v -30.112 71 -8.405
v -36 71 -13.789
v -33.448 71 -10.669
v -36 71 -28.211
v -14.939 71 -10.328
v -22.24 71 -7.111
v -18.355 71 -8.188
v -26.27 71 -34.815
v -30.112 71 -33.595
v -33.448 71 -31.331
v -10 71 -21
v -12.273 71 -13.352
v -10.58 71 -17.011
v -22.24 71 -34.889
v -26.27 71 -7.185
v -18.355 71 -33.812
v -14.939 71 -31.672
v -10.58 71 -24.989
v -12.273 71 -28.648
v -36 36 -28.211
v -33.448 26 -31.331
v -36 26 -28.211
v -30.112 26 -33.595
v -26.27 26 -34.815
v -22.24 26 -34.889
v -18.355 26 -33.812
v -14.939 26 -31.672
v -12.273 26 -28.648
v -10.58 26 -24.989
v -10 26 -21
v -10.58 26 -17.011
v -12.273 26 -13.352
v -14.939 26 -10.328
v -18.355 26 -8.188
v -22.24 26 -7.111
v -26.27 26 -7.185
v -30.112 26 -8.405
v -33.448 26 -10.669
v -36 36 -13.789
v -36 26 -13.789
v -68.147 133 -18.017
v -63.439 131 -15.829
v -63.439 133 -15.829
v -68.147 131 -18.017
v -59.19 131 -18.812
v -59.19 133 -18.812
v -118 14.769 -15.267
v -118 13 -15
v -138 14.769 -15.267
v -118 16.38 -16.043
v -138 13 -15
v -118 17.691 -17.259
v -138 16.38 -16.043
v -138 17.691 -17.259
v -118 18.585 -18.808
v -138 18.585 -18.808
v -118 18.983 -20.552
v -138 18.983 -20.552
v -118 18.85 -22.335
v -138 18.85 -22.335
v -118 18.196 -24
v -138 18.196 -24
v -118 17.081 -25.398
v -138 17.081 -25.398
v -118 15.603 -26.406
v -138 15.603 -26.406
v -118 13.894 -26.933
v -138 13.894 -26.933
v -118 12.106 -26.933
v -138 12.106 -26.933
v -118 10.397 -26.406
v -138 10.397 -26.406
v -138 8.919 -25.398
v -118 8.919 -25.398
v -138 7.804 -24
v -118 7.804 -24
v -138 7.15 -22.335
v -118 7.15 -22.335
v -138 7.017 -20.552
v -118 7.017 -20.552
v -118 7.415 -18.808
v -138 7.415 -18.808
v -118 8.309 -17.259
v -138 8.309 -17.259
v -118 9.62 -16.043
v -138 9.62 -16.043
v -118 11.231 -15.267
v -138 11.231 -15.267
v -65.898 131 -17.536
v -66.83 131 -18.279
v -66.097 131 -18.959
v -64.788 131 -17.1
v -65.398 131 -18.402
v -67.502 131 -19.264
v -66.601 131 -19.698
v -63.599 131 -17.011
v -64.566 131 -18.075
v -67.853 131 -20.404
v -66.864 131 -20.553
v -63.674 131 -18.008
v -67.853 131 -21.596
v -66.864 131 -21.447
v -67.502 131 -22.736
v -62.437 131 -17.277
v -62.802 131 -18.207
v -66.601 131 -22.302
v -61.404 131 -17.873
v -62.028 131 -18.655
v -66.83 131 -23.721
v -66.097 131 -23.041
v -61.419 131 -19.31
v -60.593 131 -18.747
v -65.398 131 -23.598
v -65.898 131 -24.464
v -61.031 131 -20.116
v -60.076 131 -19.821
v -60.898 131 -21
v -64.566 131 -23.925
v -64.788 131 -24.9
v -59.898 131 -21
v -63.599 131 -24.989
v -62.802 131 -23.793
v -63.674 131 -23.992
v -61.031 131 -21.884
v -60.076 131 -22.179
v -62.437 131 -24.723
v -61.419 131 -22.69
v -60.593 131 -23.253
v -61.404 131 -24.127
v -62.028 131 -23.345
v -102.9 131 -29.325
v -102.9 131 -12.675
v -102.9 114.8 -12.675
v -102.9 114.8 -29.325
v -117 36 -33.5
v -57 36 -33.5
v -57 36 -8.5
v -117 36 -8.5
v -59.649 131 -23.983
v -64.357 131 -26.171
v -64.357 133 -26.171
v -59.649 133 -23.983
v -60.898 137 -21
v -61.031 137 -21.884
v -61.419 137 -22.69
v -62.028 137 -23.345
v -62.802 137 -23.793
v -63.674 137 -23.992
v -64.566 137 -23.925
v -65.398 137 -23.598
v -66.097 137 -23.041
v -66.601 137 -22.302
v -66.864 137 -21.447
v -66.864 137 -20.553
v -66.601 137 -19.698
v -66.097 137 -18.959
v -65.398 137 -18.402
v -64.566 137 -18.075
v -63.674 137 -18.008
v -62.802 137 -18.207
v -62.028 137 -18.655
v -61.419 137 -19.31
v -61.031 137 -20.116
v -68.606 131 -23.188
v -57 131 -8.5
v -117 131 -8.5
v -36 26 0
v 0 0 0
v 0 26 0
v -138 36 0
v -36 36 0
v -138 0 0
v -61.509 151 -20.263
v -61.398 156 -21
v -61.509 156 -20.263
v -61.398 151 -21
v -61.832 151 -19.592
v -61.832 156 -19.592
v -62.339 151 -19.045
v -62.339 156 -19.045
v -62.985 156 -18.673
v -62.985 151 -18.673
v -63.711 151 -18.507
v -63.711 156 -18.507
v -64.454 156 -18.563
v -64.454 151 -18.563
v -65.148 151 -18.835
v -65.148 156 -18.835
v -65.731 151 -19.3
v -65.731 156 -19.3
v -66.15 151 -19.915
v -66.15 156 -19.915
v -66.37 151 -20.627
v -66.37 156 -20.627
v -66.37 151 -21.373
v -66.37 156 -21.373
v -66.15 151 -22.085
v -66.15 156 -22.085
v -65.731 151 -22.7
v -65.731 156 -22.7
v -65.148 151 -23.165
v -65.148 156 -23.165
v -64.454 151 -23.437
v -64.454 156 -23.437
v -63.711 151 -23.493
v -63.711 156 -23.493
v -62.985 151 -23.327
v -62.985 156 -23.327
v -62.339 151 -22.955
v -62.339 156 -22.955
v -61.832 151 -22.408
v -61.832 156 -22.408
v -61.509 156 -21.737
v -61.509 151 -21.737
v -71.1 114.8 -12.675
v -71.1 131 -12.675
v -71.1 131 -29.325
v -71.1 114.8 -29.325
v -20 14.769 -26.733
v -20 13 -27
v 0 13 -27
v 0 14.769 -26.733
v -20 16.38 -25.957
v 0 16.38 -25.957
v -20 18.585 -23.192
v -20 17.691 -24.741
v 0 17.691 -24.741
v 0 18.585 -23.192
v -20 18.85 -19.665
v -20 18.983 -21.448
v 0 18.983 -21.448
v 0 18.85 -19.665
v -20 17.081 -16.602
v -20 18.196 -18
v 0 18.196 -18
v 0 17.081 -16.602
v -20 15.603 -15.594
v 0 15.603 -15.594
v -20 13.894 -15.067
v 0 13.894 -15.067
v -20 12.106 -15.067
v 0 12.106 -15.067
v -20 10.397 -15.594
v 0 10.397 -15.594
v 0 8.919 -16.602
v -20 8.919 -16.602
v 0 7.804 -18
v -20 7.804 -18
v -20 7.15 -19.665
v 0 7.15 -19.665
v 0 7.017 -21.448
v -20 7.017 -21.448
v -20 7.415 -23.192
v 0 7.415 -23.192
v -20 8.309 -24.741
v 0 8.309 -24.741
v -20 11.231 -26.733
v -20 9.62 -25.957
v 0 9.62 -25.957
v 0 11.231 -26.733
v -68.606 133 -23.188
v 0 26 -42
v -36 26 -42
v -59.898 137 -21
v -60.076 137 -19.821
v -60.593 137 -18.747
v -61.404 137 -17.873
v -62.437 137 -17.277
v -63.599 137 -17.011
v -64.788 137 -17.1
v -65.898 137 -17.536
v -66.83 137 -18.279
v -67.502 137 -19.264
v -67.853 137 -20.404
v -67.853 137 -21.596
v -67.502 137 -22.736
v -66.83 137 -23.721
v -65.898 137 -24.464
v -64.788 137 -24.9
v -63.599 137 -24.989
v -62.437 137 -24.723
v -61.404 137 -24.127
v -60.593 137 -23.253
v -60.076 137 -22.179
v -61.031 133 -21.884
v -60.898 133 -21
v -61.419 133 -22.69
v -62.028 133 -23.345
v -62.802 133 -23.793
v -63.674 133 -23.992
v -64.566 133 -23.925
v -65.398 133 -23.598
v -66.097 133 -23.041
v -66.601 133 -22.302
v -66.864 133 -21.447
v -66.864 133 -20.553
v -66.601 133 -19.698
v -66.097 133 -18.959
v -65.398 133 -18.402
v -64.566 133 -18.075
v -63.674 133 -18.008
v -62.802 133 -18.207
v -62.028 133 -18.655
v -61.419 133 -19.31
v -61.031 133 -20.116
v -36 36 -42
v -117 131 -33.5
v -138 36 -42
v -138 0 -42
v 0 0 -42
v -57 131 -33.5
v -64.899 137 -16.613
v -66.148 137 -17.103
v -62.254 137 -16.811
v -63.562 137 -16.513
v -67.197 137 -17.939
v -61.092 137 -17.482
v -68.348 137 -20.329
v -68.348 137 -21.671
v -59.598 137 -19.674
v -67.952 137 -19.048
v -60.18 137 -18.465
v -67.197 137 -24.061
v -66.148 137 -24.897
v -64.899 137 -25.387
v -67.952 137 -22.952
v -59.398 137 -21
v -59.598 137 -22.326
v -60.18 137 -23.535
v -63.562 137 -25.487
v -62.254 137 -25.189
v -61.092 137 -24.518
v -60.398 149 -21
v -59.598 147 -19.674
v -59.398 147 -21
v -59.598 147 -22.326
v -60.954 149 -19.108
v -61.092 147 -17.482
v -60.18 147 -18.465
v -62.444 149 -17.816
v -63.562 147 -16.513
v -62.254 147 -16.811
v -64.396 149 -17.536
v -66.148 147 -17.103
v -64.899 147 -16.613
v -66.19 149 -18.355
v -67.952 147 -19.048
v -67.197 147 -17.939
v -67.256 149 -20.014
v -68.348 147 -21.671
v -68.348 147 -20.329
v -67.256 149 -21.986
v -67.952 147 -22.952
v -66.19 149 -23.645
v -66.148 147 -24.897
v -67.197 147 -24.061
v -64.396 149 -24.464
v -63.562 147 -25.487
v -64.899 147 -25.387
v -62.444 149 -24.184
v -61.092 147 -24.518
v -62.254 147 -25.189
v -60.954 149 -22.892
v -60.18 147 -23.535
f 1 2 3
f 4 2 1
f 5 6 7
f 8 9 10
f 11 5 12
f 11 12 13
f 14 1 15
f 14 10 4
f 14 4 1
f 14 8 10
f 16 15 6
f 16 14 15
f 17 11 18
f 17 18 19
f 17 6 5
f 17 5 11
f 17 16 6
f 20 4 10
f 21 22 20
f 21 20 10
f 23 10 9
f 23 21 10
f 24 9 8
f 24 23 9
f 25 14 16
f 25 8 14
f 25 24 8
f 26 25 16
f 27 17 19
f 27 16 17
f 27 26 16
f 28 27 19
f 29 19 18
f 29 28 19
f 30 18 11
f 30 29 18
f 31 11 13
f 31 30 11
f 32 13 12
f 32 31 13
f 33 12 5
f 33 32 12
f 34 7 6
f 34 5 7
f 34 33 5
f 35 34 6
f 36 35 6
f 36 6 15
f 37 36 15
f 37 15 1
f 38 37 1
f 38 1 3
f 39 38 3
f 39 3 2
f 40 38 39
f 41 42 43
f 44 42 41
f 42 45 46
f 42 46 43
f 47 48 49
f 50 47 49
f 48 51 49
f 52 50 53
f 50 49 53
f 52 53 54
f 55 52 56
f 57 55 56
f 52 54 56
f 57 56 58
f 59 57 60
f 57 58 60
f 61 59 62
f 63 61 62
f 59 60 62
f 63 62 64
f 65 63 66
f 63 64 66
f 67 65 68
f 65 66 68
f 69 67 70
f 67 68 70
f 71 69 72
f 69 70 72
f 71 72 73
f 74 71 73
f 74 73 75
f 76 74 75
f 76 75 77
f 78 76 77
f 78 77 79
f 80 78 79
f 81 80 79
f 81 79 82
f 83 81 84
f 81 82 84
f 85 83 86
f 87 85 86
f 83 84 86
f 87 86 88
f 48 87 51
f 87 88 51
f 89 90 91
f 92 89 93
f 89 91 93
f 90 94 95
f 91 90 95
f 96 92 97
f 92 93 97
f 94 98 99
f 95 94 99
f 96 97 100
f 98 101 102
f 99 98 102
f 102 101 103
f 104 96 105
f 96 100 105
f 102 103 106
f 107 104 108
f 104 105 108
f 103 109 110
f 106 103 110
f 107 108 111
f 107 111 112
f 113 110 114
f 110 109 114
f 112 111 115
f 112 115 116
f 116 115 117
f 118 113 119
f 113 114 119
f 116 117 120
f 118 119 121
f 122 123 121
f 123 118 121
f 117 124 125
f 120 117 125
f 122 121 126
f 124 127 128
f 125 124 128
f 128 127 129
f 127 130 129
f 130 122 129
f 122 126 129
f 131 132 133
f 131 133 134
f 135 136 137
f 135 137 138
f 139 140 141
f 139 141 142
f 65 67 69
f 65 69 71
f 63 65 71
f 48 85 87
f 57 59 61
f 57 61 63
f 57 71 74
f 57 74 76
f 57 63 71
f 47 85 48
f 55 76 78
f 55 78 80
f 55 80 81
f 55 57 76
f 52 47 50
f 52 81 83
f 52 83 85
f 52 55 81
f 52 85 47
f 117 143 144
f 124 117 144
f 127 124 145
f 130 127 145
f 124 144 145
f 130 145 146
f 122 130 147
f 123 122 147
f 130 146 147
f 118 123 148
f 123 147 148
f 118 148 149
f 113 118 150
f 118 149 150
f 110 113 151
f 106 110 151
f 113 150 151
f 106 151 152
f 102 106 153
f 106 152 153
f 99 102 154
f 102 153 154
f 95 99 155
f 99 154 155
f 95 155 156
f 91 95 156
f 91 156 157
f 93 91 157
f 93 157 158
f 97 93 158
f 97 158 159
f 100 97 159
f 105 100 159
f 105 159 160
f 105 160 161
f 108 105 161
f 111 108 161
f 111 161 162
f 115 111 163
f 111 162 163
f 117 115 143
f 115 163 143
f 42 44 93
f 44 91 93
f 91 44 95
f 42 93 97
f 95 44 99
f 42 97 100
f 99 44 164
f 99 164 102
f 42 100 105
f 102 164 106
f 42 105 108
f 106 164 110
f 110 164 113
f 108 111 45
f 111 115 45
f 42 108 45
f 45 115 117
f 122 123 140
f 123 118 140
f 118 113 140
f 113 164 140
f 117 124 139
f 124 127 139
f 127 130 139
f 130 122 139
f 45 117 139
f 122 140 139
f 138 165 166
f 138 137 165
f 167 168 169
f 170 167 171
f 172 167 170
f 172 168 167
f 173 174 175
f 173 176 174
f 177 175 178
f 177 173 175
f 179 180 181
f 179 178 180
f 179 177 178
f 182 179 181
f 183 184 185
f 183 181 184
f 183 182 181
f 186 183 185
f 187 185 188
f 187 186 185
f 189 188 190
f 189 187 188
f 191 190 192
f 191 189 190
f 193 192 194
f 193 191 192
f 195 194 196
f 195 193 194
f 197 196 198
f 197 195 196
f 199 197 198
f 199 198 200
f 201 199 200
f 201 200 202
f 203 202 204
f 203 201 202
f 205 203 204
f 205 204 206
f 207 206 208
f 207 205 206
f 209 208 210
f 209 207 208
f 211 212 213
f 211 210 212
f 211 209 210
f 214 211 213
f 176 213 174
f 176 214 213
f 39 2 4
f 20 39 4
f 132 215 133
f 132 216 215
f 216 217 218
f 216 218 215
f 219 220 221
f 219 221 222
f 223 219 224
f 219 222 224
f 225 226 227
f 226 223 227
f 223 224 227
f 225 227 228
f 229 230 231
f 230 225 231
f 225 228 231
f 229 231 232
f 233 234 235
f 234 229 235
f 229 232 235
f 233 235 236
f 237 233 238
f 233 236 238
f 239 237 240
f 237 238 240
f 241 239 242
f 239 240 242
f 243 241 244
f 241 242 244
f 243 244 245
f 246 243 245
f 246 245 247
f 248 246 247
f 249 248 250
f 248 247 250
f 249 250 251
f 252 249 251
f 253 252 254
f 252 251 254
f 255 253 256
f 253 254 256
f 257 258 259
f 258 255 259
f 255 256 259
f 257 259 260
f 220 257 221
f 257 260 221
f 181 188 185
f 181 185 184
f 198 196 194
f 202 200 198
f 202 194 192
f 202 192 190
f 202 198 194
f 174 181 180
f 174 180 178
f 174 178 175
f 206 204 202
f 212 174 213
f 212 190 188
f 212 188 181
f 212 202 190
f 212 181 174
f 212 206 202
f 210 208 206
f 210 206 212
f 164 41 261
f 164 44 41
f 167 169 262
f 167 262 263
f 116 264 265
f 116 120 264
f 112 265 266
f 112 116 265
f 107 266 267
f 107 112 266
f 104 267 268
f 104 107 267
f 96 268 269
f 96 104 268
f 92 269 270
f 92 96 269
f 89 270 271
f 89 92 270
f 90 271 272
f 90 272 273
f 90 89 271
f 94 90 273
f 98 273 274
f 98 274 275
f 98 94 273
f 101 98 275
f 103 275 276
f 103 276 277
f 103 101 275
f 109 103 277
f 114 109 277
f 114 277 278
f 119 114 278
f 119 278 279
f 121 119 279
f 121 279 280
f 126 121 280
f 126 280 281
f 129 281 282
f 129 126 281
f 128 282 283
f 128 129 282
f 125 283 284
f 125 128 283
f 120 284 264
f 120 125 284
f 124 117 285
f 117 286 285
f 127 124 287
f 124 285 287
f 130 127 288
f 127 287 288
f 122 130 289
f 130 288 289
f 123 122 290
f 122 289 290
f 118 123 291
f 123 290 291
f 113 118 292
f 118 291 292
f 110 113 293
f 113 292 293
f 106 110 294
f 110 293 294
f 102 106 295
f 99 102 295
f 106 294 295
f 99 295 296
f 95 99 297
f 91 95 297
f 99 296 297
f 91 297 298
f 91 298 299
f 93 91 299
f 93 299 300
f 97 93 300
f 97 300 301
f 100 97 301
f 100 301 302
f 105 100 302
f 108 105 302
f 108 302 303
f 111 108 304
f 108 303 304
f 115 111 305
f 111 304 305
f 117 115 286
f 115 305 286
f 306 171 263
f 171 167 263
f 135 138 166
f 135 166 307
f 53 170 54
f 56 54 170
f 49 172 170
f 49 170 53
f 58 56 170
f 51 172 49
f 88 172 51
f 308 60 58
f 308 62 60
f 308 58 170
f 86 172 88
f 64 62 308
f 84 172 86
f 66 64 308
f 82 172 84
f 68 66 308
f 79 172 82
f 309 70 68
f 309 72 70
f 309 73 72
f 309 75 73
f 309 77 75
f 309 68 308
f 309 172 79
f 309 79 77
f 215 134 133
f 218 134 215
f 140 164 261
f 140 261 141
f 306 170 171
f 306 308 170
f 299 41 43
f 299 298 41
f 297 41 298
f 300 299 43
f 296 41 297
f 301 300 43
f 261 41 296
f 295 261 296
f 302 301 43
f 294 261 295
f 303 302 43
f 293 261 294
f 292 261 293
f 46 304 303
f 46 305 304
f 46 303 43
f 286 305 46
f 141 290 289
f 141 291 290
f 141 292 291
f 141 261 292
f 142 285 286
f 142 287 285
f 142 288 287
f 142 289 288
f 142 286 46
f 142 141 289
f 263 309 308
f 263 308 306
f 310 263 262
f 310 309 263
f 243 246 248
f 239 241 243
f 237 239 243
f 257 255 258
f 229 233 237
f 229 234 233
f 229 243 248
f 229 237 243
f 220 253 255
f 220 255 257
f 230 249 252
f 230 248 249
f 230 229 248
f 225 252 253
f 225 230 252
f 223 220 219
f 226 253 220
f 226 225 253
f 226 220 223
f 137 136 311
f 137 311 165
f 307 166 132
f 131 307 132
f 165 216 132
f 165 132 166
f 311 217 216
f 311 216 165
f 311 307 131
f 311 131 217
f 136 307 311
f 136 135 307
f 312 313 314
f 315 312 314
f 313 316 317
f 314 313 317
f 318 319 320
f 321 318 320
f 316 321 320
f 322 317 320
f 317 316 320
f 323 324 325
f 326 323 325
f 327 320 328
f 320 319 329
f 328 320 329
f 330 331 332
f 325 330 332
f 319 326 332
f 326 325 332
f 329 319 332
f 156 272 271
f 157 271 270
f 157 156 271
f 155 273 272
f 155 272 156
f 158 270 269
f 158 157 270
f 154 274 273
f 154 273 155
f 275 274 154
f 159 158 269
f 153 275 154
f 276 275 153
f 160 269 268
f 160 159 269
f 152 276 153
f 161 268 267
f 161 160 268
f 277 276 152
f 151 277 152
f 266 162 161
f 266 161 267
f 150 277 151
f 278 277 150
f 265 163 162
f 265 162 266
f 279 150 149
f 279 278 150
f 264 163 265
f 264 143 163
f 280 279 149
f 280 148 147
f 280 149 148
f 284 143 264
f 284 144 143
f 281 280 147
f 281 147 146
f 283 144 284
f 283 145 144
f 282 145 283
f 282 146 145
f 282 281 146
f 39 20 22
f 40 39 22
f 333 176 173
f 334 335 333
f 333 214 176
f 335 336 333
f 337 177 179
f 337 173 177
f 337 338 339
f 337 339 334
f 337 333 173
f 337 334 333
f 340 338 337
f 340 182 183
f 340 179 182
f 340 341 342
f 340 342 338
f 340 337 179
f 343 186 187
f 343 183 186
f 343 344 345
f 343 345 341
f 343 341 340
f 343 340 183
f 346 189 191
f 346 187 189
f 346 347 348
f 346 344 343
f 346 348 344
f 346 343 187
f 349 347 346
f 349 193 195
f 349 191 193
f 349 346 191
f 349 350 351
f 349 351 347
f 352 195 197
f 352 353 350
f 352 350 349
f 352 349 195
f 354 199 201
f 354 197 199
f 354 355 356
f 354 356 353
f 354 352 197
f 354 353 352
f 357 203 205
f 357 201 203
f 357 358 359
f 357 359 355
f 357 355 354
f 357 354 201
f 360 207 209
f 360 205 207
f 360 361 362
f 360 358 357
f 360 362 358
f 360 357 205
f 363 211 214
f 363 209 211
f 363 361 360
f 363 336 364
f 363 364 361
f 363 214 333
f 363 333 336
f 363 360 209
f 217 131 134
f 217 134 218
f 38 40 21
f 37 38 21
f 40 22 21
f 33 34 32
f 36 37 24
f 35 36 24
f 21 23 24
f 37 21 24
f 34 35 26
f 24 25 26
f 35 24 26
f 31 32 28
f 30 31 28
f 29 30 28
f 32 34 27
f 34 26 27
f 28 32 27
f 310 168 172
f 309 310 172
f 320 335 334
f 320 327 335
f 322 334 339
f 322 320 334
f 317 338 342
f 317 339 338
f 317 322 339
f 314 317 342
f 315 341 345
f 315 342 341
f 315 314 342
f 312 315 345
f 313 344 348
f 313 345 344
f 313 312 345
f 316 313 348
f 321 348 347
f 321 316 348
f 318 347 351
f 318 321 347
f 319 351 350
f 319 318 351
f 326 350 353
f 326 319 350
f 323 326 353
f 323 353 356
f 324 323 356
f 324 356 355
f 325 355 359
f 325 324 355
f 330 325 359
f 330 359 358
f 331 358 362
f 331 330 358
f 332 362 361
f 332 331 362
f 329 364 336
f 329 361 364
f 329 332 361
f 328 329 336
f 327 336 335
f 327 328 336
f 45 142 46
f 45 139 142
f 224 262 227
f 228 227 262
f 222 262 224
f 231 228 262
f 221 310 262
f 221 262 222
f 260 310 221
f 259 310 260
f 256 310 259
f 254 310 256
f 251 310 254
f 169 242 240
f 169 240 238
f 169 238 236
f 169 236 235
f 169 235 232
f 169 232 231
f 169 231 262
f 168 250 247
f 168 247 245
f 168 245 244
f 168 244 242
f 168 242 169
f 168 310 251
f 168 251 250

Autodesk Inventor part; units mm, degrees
ref_plane "YZ Plane" through (0, 0, 0) normal (1, 0, 0) x (0, 1, 0)
ref_plane "XZ Plane" through (0, 0, 0) normal (0, 1, 0) x (-1, 0, 0)
sketch "Sketch1" plane through (0, 0, 0) normal (0, 1, 0) x (-1, 0, 0)
  line L0 (0, 0) -> (138, 0)
  line L1 (138, 0) -> (138, -42)
  line L2 (138, -42) -> (0, -42)
  line L3 (0, -42) -> (0, 0)
  dimension "d0" = 138
  dimension "d1" = 42
extrude "Extrusion1" add sketch "Sketch1" along normal blind 26
sketch "Sketch2" plane through (0, 26, 0) normal (0, 1, 0) x (1, 0, 0)
  line L0 (-138, 42) -> (-138, 0) projected
  line L1 (0, 42) -> (-138, 42) projected
  line L2 (-138, 0) -> (-36, 0)
  line L3 (-36, 0) -> (-36, 42)
  line L4 (-36, 42) -> (-138, 42)
  line L5 (-138, 42) -> (-138, 0)
  point P0 (0, 0)
  dimension "d4" = 102
extrude "Extrusion2" add sketch "Sketch2" along normal blind 10
sketch "Sketch3" plane through (0, 26, 0) normal (0, 1, 0) x (1, 0, 0)
  line L0 (-36, 0) -> (-36, 42) projected
  line L1 (-36, 21) -> (-24, 21)
  arc A0 (-36, 13.7889) -> (-36, 28.2111) centre (-24, 21) ccw
  line L2 (-36, 13.7889) -> (-36, 28.2111)
  point P0 (0, 0)
  dimension "d7" = 12
  dimension "d8" = 14
extrude "Extrusion3" add sketch "Sketch3" along normal blind 45
sketch "Sketch4" plane through (0, 36, 0) normal (0, 1, 0) x (1, 0, 0)
  line L0 (-138, 42) -> (-138, 0) projected
  line L1 (-138, 0) -> (-87, 0)
  line L2 (-138, 0) -> (-36, 0) projected
  line L3 (-87, 0) -> (-87, 21)
  line L4 (-36, 42) -> (-138, 42) projected
  line L5 (-57, 8.5) -> (-117, 8.5)
  line L6 (-117, 8.5) -> (-117, 33.5)
  line L7 (-117, 33.5) -> (-57, 33.5)
  line L8 (-57, 33.5) -> (-57, 8.5)
  line L9 (-57, 8.5) -> (-117, 33.5) construction
  line L10 (-117, 8.5) -> (-57, 33.5) construction
  point P0 (0, 0)
  dimension "d11" = 21
  dimension "d12" = 60
  dimension "d13" = 25
extrude "Extrusion4" add sketch "Sketch4" along normal blind 95
sketch "Sketch6" plane through (-138, 0, 0) normal (0, 0, 1) x (1, 0, 0)
  line L0 (138, 26) -> (102, 26) projected
  line L1 (102, 26) -> (138, 26)
  line L2 (138, 26) -> (138, 79.7239)
  line L3 (138, 79.7239) -> (98.9473, 78.614)
  line L4 (102, 26) -> (102, 36) projected
  line L5 (98.9473, 78.614) -> (102, 36)
  line L6 (102, 36) -> (102, 26)
  point P0 (138, 0)
split body "Split1" sketch "Sketch6" result two bodies curves L2 L3 L5 L6 L1 first body at (-23.4126, 56, -34.4872)
sketch "Sketch7" plane through (-138, 0, 0) normal (0, 0, 1) x (1, 0, 0)
  line L0 (81, 36) -> (21, 36) projected
  line L1 (81, 36) -> (81, 131) projected
  line L2 (21, 131) -> (81, 131) projected
  line L3 (21, 36) -> (21, 131) projected
  point P0 (138, 0)
split body "Split2" sketch "Sketch7" result two bodies bodies 3 curves L1 L2 L3 L0 first body at (-97, 67.6667, -9)
sketch "Sketch8" plane through (0, 0, 0) normal (1, 0, 0) x (0, 0, -1)
  line L0 (0, 0) -> (42, 0) projected
  line L1 (21, 0) -> (21, 13)
  circle A0 centre (21, 13) radius 6
  dimension "d16" = 13
  dimension "d17" = 12
extrude "Extrusion5" cut sketch "Sketch8" against normal blind 20 bodies 5
sketch "Sketch9" plane through (-138, 0, -42) normal (-1, 0, 0) x (0, 0, 1)
  circle A0 centre (21, 13) radius 6 projected
  point P0 (42, 0)
extrude "Extrusion6" cut sketch "Sketch9" against normal blind 20 bodies 5
thread "Thread1" size "M12x1.75" class "6H" standard "ANSI Metric M Profile" full length
sketch "Sketch12" plane through (-57, 131, -33.5) normal (0, 0, -1) x (-1, 0, 0)
  line L0 (0.306, -7.7857) -> (59.5727, -7.7857) construction
  line L1 (59.5727, -7.7857) -> (59.5727, -94.7807) construction
  line L2 (59.5727, -94.7807) -> (0.306, -94.7807) construction
  line L3 (0.306, -94.7807) -> (0.306, -7.7857) construction
  point P0 (-57, -131)
decal "Decal2"
sketch "Sketch13" plane through (0, 131, 0) normal (0, 1, 0) x (1, 0, 0)
  line L0 (-117, 33.5) -> (-117, 8.5) projected
  line L1 (-117, 21) -> (-87, 21)
  line L2 (-102.9, 29.325) -> (-71.1, 29.325)
  line L3 (-71.1, 29.325) -> (-71.1, 12.675)
  line L4 (-71.1, 12.675) -> (-102.9, 12.675)
  line L5 (-102.9, 12.675) -> (-102.9, 29.325)
  line L6 (-102.9, 29.325) -> (-71.1, 12.675) construction
  line L7 (-71.1, 29.325) -> (-102.9, 12.675) construction
  point P0 (0, 0)
  dimension "d38" = 30
  dimension "d39" = 31.8
  dimension "d40" = 16.65
extrude "Extrusion7" cut sketch "Sketch13" against normal blind 16.2 bodies 4
sketch "Sketch14" plane through (0, 131, 0) normal (0, 1, 0) x (1, 0, 0)
  line L0 (-71.1, 29.325) -> (-71.1, 12.675) projected
  line L1 (-71.1, 21) -> (-63.898, 21)
  circle A0 centre (-63.898, 21) radius 4
  point P0 (0, 0)
  dimension "d52" = 7.202
  dimension "d53" = 8
extrude "Extrusion8" add sketch "Sketch14" along normal blind 6 separate body
thread "Thread2" size "M8x1.25" class "6g" standard "ANSI Metric M Profile" full length
sketch "Sketch16" plane through (0, 131, 0) normal (0, 1, 0) x (1, 0, 0)
  circle A0 centre (-63.898, 21) radius 3 projected
  circle A1 centre (-63.898, 21) radius 4 projected
  line L0 (-63.4389, 15.8287) -> (-68.1469, 18.0167)
  line L1 (-68.1469, 18.0167) -> (-68.606, 23.188)
  line L2 (-68.606, 23.188) -> (-64.3571, 26.1713)
  line L3 (-64.3571, 26.1713) -> (-59.6491, 23.9833)
  line L4 (-59.6491, 23.9833) -> (-59.19, 18.812)
  line L5 (-59.19, 18.812) -> (-63.4389, 15.8287)
  point P0 (0, 0)
extrude "Extrusion10" add sketch "Sketch16" along normal blind 2 separate body contours A0 | A1 | L0 L1 L2 L3 L4 L5
sketch "Sketch17" plane through (-63.898, 137, -21) normal (0, 1, 0) x (1, 0, 0)
  circle A0 centre (0, 0) radius 3
  point P0 (63.898, -21)
  dimension "d63" = 6
extrude "Extrusion11" cut sketch "Sketch17" against normal blind 6 bodies 6 7
sketch "Sketch18" plane through (-63.898, 137, -21) normal (0, 1, 0) x (1, 0, 0)
  circle A0 centre (0, 0) radius 4.5
  point P0 (63.898, -21)
  dimension "d66" = 9
extrude "Extrusion12" add sketch "Sketch18" along normal blind 10 separate body
ref_plane "Work Plane1" through (-63.898, 151, -21) normal (0, 1, 0) x (1, 0, 0)
sketch "Sketch19" plane through (-63.898, 151, -21) normal (0, 1, 0) x (1, 0, 0)
  circle A0 centre (0, 0) radius 2.5
  point P0 (63.898, -21)
  dimension "d70" = 5
extrude "Extrusion13" add sketch "Sketch19" along normal blind 5 separate body
loft "Loft1" add bodies 8 section 1 edges at (-68.398, 147, -21) section 2 edges at (-66.398, 151, -21)
combine bodies "Combine1" operation type add bodies to combine 9 8
sketch "Sketch20" plane through (-63.898, 156, -21) normal (0, 1, 0) x (1, 0, 0)
  circle A0 centre (0, 0) radius 2.5 projected
properties part number "alicat_flujo"
